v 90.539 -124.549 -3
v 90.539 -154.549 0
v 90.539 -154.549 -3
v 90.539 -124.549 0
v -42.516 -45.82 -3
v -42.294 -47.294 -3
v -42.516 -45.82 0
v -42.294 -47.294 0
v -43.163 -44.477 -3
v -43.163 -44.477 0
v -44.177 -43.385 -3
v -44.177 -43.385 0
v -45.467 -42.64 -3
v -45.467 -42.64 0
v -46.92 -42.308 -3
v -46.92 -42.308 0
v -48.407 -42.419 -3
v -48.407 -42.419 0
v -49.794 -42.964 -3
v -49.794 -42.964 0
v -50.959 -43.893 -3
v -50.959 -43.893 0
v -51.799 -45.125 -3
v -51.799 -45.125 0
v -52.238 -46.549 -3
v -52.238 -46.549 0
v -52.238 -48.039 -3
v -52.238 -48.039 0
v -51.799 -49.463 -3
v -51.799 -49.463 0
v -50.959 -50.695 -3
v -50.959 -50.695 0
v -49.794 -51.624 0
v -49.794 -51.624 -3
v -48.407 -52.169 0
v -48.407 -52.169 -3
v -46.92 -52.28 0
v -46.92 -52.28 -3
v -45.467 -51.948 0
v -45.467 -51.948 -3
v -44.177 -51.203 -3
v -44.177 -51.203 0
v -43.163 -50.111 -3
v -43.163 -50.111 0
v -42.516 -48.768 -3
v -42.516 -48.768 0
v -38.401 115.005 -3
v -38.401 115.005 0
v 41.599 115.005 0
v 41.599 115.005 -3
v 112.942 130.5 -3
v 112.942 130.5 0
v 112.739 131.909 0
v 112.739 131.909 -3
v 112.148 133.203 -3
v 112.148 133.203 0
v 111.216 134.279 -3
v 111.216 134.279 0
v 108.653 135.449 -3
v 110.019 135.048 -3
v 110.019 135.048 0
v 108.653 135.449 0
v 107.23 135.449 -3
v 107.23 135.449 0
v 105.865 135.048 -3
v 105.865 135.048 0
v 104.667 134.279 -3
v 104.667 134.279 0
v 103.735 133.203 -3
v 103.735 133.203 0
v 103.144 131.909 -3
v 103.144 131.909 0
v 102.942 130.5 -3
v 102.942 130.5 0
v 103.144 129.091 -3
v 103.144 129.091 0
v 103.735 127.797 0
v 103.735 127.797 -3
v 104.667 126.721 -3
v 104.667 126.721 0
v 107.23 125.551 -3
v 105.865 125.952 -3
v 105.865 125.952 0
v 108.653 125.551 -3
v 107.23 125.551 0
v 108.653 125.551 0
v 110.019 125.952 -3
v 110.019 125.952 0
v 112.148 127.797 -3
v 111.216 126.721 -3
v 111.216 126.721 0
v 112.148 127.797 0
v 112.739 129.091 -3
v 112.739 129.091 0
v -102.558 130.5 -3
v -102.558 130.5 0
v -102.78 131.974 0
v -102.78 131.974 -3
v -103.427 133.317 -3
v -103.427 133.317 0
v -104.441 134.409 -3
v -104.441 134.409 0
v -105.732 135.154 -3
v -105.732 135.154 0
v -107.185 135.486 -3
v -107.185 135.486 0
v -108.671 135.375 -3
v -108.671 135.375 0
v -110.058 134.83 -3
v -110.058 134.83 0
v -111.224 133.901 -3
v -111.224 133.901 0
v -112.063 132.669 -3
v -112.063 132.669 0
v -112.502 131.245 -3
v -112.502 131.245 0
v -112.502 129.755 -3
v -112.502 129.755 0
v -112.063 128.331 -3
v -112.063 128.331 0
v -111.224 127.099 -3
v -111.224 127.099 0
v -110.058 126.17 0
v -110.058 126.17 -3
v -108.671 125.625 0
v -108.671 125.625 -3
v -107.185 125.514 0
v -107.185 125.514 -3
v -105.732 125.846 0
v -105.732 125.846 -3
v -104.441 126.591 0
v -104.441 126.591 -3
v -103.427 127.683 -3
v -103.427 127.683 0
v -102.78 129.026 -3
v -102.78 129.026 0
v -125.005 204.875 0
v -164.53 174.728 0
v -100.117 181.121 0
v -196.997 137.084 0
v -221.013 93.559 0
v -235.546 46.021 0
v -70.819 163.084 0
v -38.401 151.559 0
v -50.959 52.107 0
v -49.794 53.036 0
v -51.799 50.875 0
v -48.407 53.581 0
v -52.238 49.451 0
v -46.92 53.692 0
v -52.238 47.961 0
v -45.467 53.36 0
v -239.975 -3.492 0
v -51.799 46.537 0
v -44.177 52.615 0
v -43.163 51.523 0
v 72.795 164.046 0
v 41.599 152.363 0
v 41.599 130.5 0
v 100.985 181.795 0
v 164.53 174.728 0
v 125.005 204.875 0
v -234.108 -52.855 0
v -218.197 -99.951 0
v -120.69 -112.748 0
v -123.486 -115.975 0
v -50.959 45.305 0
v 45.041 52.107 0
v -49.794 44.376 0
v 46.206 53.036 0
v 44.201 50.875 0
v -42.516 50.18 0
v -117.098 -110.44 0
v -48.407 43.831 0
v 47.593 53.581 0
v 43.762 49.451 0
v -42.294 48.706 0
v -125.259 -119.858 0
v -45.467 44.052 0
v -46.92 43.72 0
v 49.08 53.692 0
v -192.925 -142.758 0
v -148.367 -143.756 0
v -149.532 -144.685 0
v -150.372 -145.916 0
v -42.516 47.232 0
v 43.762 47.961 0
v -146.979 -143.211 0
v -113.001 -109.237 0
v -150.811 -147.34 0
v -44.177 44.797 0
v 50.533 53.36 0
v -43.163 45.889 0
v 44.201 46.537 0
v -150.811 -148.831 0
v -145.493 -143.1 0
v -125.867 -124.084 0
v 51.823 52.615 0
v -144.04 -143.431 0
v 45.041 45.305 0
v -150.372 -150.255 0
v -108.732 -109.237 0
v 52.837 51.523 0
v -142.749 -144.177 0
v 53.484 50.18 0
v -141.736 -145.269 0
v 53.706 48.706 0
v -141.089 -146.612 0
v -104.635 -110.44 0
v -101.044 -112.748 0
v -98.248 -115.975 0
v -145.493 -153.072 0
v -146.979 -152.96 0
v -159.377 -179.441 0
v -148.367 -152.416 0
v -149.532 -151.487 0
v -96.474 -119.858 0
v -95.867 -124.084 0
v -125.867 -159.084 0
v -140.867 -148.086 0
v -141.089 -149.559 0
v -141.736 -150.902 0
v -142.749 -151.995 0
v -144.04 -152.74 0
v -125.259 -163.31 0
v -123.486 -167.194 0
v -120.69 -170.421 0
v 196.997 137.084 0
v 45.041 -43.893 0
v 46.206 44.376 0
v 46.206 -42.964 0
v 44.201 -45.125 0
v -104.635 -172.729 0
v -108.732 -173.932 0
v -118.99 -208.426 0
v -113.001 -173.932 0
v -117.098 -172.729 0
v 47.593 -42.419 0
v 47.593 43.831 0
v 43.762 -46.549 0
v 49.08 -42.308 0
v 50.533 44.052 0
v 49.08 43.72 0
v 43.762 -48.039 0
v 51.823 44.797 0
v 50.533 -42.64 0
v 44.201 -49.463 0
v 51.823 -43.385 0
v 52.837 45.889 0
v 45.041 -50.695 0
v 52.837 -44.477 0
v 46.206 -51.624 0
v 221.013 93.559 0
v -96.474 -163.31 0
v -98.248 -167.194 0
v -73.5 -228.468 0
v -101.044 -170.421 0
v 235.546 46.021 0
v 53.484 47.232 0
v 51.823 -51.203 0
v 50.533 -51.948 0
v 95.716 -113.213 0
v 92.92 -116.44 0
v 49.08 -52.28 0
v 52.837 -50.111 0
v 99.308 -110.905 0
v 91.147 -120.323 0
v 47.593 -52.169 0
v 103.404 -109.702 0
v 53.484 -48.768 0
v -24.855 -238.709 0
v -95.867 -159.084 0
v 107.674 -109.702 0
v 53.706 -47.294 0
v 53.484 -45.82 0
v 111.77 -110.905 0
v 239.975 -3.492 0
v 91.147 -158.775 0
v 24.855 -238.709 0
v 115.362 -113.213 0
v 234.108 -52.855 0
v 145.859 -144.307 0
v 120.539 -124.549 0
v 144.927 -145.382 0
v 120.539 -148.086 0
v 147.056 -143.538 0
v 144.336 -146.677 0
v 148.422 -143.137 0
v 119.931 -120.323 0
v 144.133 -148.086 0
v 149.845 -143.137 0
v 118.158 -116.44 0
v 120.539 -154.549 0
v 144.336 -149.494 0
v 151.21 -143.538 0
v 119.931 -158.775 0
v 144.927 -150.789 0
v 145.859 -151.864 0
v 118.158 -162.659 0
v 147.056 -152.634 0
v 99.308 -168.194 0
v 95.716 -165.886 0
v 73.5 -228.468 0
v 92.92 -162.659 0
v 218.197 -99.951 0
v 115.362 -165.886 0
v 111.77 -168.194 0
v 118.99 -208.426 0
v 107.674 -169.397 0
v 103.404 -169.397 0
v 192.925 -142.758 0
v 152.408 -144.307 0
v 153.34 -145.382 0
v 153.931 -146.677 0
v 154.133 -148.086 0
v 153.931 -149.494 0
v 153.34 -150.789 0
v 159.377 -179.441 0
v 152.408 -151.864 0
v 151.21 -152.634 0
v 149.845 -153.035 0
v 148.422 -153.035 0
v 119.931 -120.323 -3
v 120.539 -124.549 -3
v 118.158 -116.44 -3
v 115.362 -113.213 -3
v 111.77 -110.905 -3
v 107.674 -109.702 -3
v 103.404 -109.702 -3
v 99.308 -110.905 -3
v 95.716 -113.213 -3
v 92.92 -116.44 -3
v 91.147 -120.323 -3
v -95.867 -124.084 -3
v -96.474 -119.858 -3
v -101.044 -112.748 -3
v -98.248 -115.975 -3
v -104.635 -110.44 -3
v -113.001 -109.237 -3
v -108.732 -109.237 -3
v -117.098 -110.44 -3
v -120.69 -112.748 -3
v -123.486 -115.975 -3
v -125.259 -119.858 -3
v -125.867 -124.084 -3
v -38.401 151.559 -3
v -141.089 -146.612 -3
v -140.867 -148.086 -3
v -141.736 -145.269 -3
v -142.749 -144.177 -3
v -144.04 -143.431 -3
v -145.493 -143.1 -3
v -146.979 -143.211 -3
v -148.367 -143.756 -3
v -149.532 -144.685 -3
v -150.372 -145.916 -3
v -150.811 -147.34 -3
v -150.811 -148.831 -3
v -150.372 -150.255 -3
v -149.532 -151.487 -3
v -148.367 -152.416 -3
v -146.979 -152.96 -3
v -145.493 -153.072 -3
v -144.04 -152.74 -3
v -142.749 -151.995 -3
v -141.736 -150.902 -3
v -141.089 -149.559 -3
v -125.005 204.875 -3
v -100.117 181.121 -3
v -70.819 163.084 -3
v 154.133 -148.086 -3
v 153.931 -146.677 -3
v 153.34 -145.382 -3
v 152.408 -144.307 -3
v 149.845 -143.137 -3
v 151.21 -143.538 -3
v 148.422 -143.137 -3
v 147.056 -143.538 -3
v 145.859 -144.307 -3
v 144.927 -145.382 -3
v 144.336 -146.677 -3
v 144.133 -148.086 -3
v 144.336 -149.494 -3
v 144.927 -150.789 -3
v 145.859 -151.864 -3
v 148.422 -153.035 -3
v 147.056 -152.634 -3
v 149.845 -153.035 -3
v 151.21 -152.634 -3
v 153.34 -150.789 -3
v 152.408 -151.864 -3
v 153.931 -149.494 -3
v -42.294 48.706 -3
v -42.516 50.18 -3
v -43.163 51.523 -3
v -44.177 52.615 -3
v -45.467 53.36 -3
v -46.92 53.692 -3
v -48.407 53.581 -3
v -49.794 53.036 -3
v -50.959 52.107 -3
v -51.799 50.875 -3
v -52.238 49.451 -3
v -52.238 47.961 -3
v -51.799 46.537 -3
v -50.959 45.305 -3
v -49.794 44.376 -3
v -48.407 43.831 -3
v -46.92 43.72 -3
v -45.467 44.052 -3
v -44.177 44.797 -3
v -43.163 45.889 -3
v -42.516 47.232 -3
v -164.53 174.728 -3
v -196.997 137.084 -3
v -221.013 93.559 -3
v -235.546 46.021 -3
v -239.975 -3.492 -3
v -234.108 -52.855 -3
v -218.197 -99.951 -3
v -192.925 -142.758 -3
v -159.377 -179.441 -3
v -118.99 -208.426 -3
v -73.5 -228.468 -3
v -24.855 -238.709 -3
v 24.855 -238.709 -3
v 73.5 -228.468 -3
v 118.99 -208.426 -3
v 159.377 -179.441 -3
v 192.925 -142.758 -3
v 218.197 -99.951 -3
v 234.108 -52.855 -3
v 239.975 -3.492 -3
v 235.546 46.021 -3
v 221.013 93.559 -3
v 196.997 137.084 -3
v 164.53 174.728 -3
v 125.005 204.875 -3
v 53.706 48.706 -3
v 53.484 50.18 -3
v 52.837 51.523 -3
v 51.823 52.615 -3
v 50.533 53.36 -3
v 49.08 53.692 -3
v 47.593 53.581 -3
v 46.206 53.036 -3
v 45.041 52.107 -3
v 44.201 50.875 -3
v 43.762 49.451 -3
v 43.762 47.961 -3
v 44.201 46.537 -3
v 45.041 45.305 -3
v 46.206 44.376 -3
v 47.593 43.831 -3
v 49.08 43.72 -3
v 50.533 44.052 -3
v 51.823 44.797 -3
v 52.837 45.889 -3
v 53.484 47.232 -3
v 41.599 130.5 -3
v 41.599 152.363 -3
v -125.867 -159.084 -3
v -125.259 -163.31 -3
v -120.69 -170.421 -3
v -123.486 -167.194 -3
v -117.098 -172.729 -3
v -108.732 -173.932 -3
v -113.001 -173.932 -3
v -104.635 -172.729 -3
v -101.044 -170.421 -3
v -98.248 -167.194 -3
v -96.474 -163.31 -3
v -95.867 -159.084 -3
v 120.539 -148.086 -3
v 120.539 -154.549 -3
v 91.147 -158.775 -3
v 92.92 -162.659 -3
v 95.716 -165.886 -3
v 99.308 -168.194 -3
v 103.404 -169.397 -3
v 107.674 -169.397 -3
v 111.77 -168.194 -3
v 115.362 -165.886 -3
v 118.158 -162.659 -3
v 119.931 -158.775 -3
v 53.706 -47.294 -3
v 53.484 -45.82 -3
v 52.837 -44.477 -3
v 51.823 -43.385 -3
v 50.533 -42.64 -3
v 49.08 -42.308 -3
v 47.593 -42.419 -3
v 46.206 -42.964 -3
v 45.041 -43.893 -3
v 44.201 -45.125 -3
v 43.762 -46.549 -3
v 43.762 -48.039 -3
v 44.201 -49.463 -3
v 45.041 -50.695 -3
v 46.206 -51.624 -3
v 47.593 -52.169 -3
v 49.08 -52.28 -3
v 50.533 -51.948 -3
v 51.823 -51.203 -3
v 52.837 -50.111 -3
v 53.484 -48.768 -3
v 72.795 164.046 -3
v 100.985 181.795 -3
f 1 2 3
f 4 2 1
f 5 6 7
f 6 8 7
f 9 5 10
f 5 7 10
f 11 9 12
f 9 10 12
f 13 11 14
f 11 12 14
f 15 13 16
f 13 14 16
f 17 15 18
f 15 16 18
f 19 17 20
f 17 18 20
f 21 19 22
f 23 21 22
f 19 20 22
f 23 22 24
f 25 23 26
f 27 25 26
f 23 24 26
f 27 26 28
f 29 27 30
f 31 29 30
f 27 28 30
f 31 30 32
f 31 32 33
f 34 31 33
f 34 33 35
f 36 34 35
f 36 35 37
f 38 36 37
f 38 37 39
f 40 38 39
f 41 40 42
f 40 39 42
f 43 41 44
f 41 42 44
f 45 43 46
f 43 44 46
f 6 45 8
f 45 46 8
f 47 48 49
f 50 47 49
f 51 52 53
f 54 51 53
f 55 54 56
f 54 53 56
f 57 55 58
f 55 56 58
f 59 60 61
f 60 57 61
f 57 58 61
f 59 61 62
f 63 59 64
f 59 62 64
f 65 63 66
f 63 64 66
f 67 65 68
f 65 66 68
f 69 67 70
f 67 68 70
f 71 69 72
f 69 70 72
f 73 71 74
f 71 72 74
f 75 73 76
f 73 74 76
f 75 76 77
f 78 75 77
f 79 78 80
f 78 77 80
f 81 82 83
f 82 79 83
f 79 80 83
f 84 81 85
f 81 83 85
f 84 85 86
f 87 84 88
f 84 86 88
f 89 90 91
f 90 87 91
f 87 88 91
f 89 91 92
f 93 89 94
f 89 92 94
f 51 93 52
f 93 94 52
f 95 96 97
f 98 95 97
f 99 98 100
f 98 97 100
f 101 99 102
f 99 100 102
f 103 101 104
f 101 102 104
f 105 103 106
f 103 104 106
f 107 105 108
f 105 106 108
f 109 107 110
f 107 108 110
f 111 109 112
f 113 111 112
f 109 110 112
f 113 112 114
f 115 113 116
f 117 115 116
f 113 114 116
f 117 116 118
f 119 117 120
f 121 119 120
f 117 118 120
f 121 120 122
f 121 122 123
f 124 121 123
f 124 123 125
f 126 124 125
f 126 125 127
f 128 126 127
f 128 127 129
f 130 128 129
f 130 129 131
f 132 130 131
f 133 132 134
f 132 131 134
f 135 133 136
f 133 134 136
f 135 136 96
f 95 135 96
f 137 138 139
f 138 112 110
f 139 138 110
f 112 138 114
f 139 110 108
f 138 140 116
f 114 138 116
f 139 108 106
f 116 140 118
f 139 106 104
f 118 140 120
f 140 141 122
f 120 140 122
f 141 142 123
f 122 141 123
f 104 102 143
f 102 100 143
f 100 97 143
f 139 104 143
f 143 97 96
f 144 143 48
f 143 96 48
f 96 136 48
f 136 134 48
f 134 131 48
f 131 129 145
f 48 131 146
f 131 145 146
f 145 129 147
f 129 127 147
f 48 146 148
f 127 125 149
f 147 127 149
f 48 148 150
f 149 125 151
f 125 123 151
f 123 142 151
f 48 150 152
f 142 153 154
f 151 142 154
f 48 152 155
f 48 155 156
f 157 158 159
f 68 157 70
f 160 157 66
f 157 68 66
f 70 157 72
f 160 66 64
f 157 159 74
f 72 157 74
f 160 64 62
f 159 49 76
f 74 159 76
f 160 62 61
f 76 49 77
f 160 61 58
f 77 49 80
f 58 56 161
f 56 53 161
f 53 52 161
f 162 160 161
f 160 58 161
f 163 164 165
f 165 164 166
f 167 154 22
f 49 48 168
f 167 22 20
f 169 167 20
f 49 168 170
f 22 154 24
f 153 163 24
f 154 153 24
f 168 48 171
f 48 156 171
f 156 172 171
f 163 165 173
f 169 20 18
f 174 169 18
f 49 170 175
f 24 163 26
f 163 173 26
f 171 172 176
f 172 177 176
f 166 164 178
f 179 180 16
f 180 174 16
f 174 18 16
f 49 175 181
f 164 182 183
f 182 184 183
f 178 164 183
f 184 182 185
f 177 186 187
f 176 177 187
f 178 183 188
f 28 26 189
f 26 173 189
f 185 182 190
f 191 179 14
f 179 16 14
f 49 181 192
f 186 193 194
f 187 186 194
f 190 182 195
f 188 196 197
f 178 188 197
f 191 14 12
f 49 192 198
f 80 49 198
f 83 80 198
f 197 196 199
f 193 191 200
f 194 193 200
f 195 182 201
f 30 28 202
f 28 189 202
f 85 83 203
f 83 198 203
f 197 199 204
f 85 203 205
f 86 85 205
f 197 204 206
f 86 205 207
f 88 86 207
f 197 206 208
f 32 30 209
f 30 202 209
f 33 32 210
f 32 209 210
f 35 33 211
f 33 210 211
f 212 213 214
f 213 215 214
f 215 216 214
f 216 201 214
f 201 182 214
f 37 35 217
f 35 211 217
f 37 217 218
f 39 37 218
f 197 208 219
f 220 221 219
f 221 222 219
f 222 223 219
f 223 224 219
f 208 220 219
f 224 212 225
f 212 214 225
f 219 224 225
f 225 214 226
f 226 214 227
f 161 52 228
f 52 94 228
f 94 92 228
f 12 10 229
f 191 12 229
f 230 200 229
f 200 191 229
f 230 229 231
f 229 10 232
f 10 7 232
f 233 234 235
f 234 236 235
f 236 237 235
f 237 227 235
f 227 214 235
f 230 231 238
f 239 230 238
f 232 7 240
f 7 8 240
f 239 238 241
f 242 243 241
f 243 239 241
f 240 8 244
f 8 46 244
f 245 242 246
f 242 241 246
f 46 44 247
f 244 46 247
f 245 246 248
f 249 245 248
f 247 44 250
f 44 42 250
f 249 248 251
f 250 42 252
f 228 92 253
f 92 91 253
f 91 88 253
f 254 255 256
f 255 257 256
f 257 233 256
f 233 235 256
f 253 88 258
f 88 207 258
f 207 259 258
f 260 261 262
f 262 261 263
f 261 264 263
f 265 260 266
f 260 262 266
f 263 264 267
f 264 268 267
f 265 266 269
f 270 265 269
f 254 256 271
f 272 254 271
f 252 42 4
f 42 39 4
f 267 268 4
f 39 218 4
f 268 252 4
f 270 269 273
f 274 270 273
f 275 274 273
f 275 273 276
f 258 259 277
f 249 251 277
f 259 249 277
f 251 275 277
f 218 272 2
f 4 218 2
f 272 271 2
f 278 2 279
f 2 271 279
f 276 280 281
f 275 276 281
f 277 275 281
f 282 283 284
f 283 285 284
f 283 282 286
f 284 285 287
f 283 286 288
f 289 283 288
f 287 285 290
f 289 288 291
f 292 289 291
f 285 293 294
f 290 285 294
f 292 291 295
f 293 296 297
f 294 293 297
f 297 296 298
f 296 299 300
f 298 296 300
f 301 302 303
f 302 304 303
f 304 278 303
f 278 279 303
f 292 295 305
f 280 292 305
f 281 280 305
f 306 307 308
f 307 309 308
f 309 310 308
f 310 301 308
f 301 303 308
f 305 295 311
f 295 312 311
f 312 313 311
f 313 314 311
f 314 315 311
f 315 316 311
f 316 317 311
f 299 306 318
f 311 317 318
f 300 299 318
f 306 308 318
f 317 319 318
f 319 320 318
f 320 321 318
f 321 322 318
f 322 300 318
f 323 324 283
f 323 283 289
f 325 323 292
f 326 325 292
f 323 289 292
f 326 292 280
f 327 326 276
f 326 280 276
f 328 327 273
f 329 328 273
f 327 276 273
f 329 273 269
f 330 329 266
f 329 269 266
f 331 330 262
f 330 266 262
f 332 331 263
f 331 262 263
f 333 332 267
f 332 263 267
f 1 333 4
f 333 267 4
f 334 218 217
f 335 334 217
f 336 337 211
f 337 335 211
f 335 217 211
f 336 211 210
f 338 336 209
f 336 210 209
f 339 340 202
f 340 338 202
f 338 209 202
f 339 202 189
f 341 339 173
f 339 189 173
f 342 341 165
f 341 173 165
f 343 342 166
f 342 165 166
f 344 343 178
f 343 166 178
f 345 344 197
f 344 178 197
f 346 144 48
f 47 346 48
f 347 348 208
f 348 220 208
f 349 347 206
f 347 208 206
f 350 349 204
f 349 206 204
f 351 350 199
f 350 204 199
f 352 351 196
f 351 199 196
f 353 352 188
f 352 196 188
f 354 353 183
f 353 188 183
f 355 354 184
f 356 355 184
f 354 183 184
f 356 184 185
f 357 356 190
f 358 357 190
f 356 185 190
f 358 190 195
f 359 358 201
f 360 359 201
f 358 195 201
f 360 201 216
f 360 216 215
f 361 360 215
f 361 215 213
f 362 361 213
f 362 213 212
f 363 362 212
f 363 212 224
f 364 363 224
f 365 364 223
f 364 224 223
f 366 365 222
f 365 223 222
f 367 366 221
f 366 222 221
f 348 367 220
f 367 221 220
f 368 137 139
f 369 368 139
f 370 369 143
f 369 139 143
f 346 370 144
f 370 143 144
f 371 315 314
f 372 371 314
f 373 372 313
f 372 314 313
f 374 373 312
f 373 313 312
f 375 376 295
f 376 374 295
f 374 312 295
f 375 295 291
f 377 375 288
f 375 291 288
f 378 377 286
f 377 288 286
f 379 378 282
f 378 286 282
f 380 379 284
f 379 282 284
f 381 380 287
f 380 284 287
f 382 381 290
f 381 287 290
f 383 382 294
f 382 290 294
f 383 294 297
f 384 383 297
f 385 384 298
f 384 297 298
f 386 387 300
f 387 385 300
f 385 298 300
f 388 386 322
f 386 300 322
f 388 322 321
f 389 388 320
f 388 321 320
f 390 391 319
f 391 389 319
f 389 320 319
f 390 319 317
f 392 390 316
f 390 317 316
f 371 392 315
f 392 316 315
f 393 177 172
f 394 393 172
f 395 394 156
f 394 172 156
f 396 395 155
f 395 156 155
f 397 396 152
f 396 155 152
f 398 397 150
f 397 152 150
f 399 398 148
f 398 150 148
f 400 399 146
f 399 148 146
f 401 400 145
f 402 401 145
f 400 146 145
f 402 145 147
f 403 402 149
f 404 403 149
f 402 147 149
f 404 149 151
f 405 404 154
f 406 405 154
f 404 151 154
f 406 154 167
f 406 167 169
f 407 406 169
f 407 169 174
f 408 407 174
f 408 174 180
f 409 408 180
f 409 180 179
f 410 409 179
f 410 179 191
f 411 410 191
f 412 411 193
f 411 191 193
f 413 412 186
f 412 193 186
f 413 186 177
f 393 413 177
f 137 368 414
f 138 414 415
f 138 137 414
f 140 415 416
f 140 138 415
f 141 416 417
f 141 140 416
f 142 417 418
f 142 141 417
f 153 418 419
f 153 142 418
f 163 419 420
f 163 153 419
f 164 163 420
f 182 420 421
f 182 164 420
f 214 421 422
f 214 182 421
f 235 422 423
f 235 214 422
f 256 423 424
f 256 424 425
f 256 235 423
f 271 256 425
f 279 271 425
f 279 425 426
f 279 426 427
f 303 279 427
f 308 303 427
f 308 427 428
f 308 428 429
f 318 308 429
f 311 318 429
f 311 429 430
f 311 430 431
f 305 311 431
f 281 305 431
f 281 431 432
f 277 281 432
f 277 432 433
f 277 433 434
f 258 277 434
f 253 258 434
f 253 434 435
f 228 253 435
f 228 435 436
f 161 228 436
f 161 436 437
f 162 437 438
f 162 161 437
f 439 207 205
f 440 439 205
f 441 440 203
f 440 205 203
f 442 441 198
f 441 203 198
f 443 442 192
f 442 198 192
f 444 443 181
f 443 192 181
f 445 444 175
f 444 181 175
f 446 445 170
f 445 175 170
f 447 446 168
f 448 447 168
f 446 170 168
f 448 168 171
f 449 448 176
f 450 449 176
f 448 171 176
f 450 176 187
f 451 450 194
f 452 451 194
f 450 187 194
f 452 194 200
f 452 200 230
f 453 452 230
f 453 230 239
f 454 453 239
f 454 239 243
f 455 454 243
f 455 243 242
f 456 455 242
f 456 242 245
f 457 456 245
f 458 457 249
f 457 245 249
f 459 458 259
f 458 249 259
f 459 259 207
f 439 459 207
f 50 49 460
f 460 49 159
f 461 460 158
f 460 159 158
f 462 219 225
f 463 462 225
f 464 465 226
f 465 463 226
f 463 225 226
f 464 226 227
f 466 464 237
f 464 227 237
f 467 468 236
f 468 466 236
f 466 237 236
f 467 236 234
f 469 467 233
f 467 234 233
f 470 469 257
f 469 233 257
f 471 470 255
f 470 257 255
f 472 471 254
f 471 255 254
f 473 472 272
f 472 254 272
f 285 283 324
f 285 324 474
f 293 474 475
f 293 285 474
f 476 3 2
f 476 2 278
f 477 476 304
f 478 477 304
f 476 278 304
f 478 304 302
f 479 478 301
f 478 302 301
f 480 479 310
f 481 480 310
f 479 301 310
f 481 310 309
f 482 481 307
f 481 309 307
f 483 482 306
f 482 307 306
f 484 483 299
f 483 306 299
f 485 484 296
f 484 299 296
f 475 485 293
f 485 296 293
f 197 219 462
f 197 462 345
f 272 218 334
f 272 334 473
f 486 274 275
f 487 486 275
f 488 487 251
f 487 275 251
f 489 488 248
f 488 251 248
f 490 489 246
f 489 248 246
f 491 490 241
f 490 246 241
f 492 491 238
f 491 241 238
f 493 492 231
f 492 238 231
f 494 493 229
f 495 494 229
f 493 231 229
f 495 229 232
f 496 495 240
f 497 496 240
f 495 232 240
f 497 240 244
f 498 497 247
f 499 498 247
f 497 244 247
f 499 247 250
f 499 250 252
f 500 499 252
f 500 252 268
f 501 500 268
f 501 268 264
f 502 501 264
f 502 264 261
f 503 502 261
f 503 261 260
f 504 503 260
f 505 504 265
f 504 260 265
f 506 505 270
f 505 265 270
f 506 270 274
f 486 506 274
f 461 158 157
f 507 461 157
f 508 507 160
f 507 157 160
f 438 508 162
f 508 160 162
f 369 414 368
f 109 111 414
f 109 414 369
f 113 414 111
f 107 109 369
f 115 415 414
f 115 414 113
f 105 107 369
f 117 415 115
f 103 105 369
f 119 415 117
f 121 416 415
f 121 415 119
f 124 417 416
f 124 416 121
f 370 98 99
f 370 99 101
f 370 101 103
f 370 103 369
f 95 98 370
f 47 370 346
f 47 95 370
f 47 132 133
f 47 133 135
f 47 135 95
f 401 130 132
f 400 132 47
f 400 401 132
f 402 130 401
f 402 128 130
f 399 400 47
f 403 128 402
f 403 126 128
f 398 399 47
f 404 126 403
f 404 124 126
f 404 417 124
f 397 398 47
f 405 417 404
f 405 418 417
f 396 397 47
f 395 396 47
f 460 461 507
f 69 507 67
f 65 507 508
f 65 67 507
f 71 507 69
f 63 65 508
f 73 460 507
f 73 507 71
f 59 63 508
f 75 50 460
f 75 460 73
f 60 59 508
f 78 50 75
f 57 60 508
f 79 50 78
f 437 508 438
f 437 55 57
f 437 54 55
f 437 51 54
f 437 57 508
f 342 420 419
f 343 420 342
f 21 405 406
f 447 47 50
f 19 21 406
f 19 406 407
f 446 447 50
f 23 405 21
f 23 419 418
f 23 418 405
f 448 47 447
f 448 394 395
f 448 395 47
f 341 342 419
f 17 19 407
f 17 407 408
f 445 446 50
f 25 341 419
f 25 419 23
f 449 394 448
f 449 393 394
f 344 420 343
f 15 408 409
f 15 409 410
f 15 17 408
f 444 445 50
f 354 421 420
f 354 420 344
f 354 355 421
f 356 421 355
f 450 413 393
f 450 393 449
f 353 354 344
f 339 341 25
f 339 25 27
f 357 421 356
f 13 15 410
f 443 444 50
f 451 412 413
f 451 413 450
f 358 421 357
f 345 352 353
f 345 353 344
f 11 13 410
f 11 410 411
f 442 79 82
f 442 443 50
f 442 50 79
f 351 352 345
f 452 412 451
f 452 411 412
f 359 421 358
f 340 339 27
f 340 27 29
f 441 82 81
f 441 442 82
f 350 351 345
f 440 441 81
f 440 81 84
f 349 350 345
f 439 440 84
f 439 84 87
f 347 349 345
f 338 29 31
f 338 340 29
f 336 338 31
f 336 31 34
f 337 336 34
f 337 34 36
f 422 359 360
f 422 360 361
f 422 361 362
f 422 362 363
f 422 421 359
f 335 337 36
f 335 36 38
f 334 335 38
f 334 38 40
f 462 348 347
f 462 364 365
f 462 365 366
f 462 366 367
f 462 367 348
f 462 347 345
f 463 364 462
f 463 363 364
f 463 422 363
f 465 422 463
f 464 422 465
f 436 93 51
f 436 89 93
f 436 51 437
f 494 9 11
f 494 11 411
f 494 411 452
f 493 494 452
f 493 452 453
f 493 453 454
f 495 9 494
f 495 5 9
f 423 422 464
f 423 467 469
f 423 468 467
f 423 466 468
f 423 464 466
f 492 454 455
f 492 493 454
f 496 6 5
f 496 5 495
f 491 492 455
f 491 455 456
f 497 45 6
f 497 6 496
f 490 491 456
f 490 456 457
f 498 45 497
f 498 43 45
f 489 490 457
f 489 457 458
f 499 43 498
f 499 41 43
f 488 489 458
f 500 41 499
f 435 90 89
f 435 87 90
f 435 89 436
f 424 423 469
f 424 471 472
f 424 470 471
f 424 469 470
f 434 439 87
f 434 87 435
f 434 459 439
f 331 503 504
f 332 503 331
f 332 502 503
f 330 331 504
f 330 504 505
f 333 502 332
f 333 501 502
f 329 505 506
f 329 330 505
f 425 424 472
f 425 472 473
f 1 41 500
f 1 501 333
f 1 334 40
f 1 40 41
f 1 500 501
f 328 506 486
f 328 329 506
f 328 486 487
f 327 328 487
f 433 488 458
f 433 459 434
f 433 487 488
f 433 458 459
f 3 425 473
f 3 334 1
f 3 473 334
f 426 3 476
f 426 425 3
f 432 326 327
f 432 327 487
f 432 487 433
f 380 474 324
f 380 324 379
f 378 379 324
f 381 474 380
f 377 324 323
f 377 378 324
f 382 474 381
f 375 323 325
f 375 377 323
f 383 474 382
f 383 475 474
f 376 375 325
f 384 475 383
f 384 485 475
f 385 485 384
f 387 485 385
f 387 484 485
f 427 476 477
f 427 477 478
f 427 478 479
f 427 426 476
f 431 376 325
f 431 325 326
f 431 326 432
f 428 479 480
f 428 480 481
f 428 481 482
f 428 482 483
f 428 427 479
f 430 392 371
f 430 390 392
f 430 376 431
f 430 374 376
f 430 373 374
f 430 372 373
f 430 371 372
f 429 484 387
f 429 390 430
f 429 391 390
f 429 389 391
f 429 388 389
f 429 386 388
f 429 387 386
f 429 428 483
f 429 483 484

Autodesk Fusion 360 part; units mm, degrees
sketch "Sketch1" plane through (0, 0, 0) normal (0, 0, -1) x (1, 0, 0)
  circle A0 centre (0, 0) radius 240
  line L0 (0.0048, -240) -> (125.0048, -240)
  line L1 (125.0048, -240) -> (125.0048, -204.8751)
  line L2 (1.5986, 239.9947) -> (1.5986, -147.0053)
  line L3 (125.0048, -204.8751) -> (-125.0048, -204.8751)
  arc A1 (125.0048, -204.8751) -> (-125.0048, -204.8751) centre (0, -310.93) ccw
  circle A2 centre (-47.294, 47.294) radius 5
  line L4 (-47.294, 47.294) -> (48.706, 47.294)
  line L5 (48.706, 47.294) -> (48.706, -48.706)
  line L6 (48.706, -48.706) -> (-47.294, -48.706)
  line L7 (-47.294, -48.706) -> (-47.294, 47.294)
  circle A3 centre (48.706, 47.294) radius 5
  circle A4 centre (48.706, -48.706) radius 5
  circle A5 centre (-47.294, -48.706) radius 5
  line L8 (1.5986, 239.9947) -> (251.5986, 239.9947)
  line L9 (-47.294, 47.294) -> (-47.294, 235.294)
  line L10 (-47.294, 47.294) -> (-235.294, 47.294)
  line L11 (105.5391, 215.5493) -> (105.5391, 169.5493)
  line L12 (105.5391, 169.5493) -> (105.5391, 109.5493)
  line L13 (105.5391, 109.5493) -> (213.5391, 109.5493)
  line L14 (105.5391, 109.5493) -> (105.5391, 124.5493)
  line L15 (105.5391, 169.5493) -> (105.5391, 154.5493)
  line L16 (120.5391, 124.5493) -> (120.5391, 154.5493)
  arc A6 (120.5391, 154.5493) -> (90.5391, 154.5493) centre (105.5391, 154.5493) ccw
  line L17 (90.5391, 154.5493) -> (90.5391, 124.5493)
  arc A7 (90.5391, 124.5493) -> (120.5391, 124.5493) centre (105.5391, 124.5493) ccw
  line L18 (105.5391, 124.5493) -> (105.5391, 154.5493) construction
  line L19 (1.5986, -147.0053) -> (41.5986, -147.0053)
  line L20 (41.5986, -147.0053) -> (41.5986, -152.3633)
  line L21 (1.5986, -147.0053) -> (1.5986, -115.0053)
  line L22 (1.5986, -115.0053) -> (-38.4014, -115.0053)
  line L23 (41.5986, -152.3633) -> (-38.4014, -152.3633)
  line L24 (-38.4014, -152.3633) -> (-38.4014, -115.0053)
  line L25 (-38.4014, -115.0053) -> (41.5986, -115.0053)
  line L26 (41.5986, -115.0053) -> (41.5986, -152.3633)
  line L27 (-145.8667, 190.5857) -> (-145.8667, 148.0857)
  line L28 (-145.8667, 148.0857) -> (-188.8667, 148.0857)
  circle A8 centre (-145.8667, 148.0857) radius 5
  line L29 (-145.8667, 148.0857) -> (-110.8667, 148.0857)
  line L30 (-110.8667, 159.0843) -> (-110.8667, 124.0843)
  line L31 (-125.8667, 159.0843) -> (-125.8667, 124.0843)
  arc A9 (-125.8667, 124.0843) -> (-95.8667, 124.0843) centre (-110.8667, 124.0843) ccw
  line L32 (-95.8667, 124.0843) -> (-95.8667, 159.0843)
  arc A10 (-95.8667, 159.0843) -> (-125.8667, 159.0843) centre (-110.8667, 159.0843) ccw
  line L33 (-110.8667, 159.0843) -> (-110.8667, 124.0843) construction
  line L34 (-110.8667, 148.0857) -> (-110.8667, 159.0843)
  line L35 (-107.1508, -115.0053) -> (-107.5583, -130.5)
  circle A11 centre (-107.5583, -130.5) radius 5
  line L36 (-38.4014, -115.0053) -> (-210.6508, -115.0053)
  line L37 (-210.6508, -115.0053) -> (-107.1508, -115.0053)
  line L38 (152.5158, 185.3077) -> (67.5158, 185.3077)
  line L39 (67.5158, 185.3077) -> (67.5158, 230.3077)
  line L40 (-107.5583, -130.5) -> (107.9417, -130.5)
  circle A12 centre (107.9417, -130.5) radius 5
  line L41 (-145.8667, 148.0857) -> (149.1333, 148.0857)
  circle A13 centre (149.1333, 148.0857) radius 5
  dimension "d1" = 480
  dimension "d2" = 125
  dimension "d3" = 387
  dimension "d7" = 10
  dimension "d8" = 96
  dimension "d9" = 96
  dimension "d10" = 10
  dimension "d11" = 10
  dimension "d12" = 10
  dimension "d13" = 250
  dimension "d14" = 188
  dimension "d15" = 188
  dimension "d16" = 46
  dimension "d17" = 60
  dimension "d18" = 108
  dimension "d19" = 15
  dimension "d20" = 15
  dimension "d21" = 30
  dimension "d22" = 40
  dimension "d23" = 32
  dimension "d24" = 40
  dimension "d25" = 42.5
  dimension "d26" = 43
  dimension "d27" = 10
  dimension "d28" = 35
  dimension "d29" = 35
  dimension "d30" = 30
  dimension "d32" = 15.5
  dimension "d33" = 10
  dimension "d34" = 103.5
  dimension "d35" = 85
  dimension "d36" = 45
  dimension "d40" = 215.5
  dimension "d41" = 10
  dimension "d42" = 295
  dimension "d43" = 10
extrude "Extrude3" add sketch "Sketch1" along normal blind 3 contours A0 L2 A1 L4 L5 L6 A3 A4 L13 L17 A7 L20 L25 L26 L41 | A0 L11 L13 L16 A6 A7 L38 | A0 L11 L38 | A0 A1 L24 L35 A11 L36 L37 L40 | A0 L11 L38 L39 | A0 L2 L11 A6 L17 L38 L39 L41 | A0 L2 A2 L6 L7 A5 L10 L22 L25 L36 L37 | A0 A2 L9 L10 L28 A8 L29 L31 A9 L32 L41 | L24 L35 A11 L36 L40 | A0 L2 L9 L41 | L2 A2 L4 L9 L41 | A0 L27 L28 A8 | A0 L9 L27 A8 L29 L31 L32 A10 L41 | L2 L4 L5 L6 A3 A4 | L2 A2 L4 L6 L7 A5
equation "d2 = ( 250 / 2 ) * 1 mm"
equation "d3 = 355 mm + 32 mm"
